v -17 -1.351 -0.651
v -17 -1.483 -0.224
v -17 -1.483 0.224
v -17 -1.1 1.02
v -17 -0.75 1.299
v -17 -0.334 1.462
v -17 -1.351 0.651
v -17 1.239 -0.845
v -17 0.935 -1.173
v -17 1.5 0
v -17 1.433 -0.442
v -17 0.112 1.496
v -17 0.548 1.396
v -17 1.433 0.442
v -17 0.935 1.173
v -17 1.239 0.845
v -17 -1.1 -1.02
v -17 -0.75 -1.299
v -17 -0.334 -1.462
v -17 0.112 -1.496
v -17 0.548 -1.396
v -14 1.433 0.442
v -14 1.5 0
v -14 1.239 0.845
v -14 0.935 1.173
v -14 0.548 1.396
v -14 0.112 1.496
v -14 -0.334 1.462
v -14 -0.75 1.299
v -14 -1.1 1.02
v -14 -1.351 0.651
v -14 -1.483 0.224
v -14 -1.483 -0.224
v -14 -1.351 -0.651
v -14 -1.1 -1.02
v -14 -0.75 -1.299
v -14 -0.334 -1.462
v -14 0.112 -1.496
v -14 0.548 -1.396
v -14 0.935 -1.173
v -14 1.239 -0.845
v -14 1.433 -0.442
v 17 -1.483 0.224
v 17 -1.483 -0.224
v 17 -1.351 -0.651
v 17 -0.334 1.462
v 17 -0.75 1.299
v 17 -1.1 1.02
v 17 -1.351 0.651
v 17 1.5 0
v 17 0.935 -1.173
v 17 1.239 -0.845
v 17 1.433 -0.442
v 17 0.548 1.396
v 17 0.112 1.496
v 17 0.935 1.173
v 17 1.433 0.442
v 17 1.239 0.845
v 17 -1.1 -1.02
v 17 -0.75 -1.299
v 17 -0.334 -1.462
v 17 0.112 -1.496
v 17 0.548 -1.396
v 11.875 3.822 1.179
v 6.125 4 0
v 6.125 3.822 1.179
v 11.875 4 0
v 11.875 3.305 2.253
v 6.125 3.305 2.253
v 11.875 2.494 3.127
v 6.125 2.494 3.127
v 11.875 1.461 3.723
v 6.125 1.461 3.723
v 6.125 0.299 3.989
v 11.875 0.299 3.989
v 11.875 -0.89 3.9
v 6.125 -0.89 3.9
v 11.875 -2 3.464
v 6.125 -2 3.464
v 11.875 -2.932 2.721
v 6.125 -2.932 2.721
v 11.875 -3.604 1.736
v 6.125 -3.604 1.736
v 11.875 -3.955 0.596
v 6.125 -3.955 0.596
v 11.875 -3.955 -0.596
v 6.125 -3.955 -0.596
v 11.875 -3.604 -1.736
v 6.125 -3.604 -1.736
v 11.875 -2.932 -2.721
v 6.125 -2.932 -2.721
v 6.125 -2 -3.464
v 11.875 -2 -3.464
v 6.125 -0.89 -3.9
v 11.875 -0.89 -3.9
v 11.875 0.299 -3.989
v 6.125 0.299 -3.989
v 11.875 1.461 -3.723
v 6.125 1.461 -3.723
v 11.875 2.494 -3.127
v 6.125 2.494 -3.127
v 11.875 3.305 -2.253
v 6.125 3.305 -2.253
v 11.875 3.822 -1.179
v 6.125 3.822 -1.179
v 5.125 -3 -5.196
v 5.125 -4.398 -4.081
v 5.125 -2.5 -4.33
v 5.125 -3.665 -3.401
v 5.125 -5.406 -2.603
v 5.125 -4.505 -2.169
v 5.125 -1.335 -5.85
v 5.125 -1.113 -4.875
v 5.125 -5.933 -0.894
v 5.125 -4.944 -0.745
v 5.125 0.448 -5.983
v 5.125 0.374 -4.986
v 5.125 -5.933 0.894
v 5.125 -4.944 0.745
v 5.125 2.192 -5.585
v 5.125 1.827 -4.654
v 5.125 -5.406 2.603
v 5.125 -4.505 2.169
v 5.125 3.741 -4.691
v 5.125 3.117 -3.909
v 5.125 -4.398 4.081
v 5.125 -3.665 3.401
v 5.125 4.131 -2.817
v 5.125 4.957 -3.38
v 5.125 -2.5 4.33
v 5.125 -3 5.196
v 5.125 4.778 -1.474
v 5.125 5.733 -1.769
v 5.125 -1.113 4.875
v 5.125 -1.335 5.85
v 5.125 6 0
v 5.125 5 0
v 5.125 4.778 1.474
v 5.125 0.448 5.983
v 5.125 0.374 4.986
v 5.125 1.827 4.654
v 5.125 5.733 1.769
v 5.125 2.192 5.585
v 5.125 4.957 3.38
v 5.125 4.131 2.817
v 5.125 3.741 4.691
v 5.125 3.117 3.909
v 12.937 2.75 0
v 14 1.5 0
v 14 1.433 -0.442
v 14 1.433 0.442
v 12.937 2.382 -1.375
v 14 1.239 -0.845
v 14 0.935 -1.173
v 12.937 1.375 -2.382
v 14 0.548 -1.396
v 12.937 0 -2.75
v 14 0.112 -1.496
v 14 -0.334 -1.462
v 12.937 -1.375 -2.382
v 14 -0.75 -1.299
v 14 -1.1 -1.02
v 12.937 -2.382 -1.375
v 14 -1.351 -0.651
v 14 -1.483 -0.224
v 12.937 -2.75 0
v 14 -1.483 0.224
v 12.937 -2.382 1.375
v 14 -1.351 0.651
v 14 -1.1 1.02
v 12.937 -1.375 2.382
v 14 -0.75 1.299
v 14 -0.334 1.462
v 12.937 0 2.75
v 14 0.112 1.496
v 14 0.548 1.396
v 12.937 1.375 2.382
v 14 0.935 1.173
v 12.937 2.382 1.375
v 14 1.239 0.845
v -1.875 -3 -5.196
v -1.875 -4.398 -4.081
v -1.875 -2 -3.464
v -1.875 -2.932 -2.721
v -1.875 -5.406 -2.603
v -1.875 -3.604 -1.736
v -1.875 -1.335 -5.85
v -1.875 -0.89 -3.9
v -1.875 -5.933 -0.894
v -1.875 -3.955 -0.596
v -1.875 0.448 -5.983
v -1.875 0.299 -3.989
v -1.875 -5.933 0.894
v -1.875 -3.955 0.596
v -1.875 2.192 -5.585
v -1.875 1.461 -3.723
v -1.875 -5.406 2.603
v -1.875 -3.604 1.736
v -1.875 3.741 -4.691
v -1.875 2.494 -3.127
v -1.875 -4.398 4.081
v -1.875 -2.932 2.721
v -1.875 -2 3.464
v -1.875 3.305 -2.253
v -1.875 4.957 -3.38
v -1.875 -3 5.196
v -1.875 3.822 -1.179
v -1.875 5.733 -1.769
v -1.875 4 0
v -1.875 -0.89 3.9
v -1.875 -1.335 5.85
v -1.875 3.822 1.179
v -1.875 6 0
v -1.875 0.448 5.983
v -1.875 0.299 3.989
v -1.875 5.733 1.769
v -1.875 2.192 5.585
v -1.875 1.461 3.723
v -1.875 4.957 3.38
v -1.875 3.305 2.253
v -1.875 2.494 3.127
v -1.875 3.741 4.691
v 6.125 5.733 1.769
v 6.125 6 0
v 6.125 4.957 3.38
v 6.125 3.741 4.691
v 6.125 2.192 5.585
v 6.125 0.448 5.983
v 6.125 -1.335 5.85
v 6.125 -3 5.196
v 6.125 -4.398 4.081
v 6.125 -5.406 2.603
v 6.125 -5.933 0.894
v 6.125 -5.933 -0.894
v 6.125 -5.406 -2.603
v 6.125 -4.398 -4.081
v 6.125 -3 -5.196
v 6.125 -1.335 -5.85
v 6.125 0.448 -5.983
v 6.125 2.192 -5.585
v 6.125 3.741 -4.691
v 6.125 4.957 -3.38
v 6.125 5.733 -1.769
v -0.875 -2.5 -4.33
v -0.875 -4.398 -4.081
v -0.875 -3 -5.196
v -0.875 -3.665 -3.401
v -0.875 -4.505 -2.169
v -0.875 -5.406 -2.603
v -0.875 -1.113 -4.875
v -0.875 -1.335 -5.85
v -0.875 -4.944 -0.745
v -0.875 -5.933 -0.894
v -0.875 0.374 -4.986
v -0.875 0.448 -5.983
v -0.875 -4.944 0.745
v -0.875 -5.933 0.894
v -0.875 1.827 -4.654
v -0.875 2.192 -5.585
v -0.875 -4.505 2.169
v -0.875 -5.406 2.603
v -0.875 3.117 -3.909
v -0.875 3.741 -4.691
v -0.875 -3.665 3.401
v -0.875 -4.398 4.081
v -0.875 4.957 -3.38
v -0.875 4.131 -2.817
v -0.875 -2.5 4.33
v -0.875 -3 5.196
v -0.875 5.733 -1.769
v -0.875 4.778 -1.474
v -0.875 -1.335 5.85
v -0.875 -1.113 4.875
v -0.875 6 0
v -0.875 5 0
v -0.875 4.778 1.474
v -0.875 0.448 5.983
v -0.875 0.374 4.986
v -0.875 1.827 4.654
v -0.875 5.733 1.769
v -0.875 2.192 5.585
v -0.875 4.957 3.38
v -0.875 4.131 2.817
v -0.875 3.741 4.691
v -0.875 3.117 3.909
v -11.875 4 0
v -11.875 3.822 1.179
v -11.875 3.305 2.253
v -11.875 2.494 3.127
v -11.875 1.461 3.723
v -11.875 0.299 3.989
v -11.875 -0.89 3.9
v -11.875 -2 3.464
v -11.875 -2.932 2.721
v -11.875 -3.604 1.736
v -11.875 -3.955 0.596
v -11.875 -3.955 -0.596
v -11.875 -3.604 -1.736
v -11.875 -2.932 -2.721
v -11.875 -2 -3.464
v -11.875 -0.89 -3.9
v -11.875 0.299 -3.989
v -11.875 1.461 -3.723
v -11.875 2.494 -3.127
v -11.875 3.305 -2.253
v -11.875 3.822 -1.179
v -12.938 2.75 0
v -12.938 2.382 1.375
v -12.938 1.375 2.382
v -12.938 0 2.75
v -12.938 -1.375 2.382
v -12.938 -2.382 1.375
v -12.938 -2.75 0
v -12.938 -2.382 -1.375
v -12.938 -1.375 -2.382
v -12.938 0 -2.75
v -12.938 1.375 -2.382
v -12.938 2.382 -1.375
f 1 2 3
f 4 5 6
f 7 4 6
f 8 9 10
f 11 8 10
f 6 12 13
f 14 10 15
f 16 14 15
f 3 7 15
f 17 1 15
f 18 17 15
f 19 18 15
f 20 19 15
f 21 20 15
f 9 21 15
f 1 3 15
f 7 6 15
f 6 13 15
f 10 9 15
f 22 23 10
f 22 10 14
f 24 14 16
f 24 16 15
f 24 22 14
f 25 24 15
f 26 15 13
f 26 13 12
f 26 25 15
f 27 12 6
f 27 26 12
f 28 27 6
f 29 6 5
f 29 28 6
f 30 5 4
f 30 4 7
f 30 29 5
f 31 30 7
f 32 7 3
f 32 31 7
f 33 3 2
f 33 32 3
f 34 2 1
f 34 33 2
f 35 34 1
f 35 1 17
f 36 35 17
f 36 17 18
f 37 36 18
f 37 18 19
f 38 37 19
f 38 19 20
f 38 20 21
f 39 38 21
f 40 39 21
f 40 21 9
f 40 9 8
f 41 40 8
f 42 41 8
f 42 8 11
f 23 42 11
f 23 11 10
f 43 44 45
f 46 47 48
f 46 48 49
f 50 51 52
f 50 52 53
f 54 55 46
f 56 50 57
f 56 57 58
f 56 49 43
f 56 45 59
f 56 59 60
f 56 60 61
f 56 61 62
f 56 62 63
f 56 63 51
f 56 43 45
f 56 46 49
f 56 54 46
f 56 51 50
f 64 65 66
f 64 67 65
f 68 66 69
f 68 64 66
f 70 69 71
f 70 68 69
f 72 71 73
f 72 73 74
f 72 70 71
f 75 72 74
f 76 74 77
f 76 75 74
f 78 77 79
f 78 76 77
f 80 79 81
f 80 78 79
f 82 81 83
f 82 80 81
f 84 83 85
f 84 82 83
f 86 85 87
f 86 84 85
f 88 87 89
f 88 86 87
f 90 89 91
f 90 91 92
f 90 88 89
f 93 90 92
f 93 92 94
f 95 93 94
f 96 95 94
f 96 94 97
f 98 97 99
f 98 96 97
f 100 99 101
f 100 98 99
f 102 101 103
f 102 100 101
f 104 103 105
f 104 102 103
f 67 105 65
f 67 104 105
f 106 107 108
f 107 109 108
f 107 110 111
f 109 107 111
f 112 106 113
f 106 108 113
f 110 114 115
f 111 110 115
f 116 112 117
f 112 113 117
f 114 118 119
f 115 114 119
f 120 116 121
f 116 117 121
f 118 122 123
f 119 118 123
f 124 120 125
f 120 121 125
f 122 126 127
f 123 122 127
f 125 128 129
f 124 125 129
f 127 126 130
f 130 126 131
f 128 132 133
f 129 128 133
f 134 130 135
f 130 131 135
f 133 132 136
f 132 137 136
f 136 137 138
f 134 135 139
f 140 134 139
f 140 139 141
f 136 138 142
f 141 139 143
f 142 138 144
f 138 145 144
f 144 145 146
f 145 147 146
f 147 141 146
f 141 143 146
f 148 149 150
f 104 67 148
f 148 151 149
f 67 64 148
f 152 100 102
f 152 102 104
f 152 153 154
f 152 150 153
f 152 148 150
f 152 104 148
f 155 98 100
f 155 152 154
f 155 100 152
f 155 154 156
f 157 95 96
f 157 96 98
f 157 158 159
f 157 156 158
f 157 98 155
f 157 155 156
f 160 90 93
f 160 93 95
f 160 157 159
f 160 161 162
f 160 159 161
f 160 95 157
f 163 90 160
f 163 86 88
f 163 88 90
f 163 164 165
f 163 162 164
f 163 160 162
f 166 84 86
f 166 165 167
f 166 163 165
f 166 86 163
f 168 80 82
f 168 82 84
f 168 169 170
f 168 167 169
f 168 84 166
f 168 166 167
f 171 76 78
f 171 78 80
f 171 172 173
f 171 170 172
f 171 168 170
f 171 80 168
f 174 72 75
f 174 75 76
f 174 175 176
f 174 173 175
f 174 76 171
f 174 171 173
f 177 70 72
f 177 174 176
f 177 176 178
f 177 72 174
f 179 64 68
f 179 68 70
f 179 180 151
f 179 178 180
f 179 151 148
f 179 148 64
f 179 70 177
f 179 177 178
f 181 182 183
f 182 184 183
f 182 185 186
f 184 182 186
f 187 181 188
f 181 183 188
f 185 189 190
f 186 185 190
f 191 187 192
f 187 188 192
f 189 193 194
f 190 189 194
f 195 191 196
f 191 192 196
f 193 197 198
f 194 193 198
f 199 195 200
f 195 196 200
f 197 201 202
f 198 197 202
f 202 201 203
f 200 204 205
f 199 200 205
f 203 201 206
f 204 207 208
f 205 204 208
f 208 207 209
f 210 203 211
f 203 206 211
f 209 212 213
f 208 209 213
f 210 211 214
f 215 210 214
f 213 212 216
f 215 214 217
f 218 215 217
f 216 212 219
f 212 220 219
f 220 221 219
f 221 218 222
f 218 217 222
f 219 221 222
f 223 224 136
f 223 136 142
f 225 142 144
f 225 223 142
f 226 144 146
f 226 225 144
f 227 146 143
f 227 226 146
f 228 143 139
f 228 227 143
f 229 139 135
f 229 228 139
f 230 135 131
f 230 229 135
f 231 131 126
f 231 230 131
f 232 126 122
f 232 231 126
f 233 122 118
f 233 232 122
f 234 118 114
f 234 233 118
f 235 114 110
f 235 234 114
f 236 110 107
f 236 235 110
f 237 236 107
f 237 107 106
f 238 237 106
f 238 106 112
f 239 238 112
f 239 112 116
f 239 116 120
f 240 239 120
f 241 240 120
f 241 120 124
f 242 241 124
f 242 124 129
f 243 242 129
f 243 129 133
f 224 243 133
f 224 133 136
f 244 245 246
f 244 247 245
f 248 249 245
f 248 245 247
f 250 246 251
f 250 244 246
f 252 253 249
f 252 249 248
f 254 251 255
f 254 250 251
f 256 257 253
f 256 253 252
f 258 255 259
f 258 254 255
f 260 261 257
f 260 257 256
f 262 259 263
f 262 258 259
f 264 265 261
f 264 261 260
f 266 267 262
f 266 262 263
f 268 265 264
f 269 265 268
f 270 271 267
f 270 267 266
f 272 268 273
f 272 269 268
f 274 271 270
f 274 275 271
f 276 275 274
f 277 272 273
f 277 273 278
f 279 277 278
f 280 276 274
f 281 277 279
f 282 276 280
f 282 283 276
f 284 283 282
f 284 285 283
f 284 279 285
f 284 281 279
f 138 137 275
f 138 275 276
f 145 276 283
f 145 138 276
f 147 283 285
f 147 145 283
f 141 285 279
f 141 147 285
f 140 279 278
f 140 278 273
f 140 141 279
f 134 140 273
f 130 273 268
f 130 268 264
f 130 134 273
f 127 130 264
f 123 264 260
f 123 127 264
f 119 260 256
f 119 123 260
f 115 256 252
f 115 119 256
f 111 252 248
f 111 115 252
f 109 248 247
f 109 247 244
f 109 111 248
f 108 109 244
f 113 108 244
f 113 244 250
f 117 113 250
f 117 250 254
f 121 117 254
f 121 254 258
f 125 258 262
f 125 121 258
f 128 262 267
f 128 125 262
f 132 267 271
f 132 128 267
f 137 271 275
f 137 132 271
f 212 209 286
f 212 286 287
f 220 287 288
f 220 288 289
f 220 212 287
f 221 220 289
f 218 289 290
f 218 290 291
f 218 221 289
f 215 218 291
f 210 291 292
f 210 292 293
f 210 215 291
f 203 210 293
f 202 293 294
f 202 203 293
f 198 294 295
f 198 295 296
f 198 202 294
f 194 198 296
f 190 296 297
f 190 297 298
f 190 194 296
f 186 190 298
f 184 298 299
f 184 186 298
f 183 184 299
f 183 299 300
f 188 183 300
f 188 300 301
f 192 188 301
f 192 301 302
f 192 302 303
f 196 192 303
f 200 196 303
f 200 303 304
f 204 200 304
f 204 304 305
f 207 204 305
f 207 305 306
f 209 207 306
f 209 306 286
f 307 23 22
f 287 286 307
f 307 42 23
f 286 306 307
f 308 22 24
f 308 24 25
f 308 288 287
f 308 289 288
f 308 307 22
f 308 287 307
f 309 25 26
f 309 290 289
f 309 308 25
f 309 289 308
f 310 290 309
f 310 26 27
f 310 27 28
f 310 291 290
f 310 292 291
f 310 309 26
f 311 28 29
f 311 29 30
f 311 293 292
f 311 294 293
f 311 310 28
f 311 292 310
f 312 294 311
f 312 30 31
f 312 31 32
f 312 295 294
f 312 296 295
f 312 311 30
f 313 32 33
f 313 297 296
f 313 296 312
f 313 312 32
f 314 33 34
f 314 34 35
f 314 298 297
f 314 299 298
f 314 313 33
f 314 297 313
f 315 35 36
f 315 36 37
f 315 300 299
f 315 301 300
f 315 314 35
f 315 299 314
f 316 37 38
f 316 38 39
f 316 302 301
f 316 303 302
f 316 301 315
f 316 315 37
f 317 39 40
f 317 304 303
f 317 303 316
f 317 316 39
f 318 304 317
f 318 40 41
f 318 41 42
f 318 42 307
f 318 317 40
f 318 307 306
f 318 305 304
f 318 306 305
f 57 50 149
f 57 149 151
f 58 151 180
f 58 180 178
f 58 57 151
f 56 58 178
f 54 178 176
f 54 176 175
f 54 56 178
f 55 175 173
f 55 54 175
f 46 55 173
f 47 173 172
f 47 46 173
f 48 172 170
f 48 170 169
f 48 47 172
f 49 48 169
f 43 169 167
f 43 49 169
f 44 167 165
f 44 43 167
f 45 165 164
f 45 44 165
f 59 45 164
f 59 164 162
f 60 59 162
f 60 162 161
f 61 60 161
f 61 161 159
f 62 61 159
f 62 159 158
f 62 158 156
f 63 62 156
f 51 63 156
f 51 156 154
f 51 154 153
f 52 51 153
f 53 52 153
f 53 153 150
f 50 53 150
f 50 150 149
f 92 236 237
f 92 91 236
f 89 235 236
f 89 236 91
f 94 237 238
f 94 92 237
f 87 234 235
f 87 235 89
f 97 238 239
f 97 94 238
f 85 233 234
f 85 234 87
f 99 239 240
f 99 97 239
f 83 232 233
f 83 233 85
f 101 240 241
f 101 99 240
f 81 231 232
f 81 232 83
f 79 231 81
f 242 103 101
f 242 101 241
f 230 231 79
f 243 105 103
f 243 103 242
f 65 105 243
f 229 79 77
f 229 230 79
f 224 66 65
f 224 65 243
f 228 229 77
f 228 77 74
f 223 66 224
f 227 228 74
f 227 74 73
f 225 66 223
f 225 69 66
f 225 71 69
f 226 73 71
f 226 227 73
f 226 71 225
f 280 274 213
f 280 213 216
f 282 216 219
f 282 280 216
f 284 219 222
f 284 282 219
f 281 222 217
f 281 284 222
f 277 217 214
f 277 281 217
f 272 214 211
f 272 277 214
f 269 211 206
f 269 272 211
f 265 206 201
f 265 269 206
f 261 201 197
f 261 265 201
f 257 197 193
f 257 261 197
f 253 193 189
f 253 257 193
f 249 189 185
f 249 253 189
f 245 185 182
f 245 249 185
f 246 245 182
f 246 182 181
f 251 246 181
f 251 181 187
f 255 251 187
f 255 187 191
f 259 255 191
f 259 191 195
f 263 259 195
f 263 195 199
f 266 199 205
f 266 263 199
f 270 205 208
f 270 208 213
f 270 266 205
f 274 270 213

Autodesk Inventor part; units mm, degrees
ref_plane "YZ Plane" through (0, 0, 0) normal (1, 0, 0) x (0, 1, 0)
ref_plane "XZ Plane" through (0, 0, 0) normal (0, 1, 0) x (-1, 0, 0)
ref_plane "XY Plane" through (0, 0, 0) normal (0, 0, 1) x (1, 0, 0)
sketch "Esquisse1" plane through (0, 0, 0) normal (0, 0, 1) x (1, 0, 0)
  line L0 (-17, 0) -> (-17, 1.5)
  line L1 (-17, 1.5) -> (-14, 1.5)
  line L2 (-14, 1.5) -> (-11.875, 4)
  line L3 (-11.875, 4) -> (-1.875, 4)
  line L4 (-1.875, 4) -> (-1.875, 6)
  line L5 (-1.875, 6) -> (-0.875, 6)
  line L6 (-0.875, 6) -> (-0.875, 5)
  line L7 (5.125, 5) -> (5.125, 6)
  line L8 (5.125, 6) -> (6.125, 6)
  line L9 (6.125, 6) -> (6.125, 4)
  line L10 (6.125, 4) -> (11.875, 4)
  line L11 (11.875, 4) -> (14, 1.5)
  line L12 (14, 1.5) -> (17, 1.5)
  line L13 (17, 1.5) -> (17, 0)
  line L14 (-17, 0) -> (17, 0)
  line L15 (-44.329, 0) -> (0, 0)
  line L16 (-0.875, 5) -> (5.125, 5)
  dimension "d0" = 34
  dimension "d1" = 3
  dimension "d2" = 8
  dimension "d4" = 12
  dimension "d5" = 10
  dimension "d6" = 6
  dimension "d7" = 1
  dimension "d8" = 1
  dimension "d9" = 5.75
  dimension "d10" = 10
  dimension "d12" = 3
  dimension "d13" = 17
  dimension "d17" = 3
revolve "Révolution1" add sketch "Esquisse1" angle 360 about axis through (-44.329, 0, 0) along (1, 0, 0)
equation "\"d8\" = d7"
equation "\"d13\" = 0.5 * d0"
properties part number "Axe de renvoie" material "Aluminium"
